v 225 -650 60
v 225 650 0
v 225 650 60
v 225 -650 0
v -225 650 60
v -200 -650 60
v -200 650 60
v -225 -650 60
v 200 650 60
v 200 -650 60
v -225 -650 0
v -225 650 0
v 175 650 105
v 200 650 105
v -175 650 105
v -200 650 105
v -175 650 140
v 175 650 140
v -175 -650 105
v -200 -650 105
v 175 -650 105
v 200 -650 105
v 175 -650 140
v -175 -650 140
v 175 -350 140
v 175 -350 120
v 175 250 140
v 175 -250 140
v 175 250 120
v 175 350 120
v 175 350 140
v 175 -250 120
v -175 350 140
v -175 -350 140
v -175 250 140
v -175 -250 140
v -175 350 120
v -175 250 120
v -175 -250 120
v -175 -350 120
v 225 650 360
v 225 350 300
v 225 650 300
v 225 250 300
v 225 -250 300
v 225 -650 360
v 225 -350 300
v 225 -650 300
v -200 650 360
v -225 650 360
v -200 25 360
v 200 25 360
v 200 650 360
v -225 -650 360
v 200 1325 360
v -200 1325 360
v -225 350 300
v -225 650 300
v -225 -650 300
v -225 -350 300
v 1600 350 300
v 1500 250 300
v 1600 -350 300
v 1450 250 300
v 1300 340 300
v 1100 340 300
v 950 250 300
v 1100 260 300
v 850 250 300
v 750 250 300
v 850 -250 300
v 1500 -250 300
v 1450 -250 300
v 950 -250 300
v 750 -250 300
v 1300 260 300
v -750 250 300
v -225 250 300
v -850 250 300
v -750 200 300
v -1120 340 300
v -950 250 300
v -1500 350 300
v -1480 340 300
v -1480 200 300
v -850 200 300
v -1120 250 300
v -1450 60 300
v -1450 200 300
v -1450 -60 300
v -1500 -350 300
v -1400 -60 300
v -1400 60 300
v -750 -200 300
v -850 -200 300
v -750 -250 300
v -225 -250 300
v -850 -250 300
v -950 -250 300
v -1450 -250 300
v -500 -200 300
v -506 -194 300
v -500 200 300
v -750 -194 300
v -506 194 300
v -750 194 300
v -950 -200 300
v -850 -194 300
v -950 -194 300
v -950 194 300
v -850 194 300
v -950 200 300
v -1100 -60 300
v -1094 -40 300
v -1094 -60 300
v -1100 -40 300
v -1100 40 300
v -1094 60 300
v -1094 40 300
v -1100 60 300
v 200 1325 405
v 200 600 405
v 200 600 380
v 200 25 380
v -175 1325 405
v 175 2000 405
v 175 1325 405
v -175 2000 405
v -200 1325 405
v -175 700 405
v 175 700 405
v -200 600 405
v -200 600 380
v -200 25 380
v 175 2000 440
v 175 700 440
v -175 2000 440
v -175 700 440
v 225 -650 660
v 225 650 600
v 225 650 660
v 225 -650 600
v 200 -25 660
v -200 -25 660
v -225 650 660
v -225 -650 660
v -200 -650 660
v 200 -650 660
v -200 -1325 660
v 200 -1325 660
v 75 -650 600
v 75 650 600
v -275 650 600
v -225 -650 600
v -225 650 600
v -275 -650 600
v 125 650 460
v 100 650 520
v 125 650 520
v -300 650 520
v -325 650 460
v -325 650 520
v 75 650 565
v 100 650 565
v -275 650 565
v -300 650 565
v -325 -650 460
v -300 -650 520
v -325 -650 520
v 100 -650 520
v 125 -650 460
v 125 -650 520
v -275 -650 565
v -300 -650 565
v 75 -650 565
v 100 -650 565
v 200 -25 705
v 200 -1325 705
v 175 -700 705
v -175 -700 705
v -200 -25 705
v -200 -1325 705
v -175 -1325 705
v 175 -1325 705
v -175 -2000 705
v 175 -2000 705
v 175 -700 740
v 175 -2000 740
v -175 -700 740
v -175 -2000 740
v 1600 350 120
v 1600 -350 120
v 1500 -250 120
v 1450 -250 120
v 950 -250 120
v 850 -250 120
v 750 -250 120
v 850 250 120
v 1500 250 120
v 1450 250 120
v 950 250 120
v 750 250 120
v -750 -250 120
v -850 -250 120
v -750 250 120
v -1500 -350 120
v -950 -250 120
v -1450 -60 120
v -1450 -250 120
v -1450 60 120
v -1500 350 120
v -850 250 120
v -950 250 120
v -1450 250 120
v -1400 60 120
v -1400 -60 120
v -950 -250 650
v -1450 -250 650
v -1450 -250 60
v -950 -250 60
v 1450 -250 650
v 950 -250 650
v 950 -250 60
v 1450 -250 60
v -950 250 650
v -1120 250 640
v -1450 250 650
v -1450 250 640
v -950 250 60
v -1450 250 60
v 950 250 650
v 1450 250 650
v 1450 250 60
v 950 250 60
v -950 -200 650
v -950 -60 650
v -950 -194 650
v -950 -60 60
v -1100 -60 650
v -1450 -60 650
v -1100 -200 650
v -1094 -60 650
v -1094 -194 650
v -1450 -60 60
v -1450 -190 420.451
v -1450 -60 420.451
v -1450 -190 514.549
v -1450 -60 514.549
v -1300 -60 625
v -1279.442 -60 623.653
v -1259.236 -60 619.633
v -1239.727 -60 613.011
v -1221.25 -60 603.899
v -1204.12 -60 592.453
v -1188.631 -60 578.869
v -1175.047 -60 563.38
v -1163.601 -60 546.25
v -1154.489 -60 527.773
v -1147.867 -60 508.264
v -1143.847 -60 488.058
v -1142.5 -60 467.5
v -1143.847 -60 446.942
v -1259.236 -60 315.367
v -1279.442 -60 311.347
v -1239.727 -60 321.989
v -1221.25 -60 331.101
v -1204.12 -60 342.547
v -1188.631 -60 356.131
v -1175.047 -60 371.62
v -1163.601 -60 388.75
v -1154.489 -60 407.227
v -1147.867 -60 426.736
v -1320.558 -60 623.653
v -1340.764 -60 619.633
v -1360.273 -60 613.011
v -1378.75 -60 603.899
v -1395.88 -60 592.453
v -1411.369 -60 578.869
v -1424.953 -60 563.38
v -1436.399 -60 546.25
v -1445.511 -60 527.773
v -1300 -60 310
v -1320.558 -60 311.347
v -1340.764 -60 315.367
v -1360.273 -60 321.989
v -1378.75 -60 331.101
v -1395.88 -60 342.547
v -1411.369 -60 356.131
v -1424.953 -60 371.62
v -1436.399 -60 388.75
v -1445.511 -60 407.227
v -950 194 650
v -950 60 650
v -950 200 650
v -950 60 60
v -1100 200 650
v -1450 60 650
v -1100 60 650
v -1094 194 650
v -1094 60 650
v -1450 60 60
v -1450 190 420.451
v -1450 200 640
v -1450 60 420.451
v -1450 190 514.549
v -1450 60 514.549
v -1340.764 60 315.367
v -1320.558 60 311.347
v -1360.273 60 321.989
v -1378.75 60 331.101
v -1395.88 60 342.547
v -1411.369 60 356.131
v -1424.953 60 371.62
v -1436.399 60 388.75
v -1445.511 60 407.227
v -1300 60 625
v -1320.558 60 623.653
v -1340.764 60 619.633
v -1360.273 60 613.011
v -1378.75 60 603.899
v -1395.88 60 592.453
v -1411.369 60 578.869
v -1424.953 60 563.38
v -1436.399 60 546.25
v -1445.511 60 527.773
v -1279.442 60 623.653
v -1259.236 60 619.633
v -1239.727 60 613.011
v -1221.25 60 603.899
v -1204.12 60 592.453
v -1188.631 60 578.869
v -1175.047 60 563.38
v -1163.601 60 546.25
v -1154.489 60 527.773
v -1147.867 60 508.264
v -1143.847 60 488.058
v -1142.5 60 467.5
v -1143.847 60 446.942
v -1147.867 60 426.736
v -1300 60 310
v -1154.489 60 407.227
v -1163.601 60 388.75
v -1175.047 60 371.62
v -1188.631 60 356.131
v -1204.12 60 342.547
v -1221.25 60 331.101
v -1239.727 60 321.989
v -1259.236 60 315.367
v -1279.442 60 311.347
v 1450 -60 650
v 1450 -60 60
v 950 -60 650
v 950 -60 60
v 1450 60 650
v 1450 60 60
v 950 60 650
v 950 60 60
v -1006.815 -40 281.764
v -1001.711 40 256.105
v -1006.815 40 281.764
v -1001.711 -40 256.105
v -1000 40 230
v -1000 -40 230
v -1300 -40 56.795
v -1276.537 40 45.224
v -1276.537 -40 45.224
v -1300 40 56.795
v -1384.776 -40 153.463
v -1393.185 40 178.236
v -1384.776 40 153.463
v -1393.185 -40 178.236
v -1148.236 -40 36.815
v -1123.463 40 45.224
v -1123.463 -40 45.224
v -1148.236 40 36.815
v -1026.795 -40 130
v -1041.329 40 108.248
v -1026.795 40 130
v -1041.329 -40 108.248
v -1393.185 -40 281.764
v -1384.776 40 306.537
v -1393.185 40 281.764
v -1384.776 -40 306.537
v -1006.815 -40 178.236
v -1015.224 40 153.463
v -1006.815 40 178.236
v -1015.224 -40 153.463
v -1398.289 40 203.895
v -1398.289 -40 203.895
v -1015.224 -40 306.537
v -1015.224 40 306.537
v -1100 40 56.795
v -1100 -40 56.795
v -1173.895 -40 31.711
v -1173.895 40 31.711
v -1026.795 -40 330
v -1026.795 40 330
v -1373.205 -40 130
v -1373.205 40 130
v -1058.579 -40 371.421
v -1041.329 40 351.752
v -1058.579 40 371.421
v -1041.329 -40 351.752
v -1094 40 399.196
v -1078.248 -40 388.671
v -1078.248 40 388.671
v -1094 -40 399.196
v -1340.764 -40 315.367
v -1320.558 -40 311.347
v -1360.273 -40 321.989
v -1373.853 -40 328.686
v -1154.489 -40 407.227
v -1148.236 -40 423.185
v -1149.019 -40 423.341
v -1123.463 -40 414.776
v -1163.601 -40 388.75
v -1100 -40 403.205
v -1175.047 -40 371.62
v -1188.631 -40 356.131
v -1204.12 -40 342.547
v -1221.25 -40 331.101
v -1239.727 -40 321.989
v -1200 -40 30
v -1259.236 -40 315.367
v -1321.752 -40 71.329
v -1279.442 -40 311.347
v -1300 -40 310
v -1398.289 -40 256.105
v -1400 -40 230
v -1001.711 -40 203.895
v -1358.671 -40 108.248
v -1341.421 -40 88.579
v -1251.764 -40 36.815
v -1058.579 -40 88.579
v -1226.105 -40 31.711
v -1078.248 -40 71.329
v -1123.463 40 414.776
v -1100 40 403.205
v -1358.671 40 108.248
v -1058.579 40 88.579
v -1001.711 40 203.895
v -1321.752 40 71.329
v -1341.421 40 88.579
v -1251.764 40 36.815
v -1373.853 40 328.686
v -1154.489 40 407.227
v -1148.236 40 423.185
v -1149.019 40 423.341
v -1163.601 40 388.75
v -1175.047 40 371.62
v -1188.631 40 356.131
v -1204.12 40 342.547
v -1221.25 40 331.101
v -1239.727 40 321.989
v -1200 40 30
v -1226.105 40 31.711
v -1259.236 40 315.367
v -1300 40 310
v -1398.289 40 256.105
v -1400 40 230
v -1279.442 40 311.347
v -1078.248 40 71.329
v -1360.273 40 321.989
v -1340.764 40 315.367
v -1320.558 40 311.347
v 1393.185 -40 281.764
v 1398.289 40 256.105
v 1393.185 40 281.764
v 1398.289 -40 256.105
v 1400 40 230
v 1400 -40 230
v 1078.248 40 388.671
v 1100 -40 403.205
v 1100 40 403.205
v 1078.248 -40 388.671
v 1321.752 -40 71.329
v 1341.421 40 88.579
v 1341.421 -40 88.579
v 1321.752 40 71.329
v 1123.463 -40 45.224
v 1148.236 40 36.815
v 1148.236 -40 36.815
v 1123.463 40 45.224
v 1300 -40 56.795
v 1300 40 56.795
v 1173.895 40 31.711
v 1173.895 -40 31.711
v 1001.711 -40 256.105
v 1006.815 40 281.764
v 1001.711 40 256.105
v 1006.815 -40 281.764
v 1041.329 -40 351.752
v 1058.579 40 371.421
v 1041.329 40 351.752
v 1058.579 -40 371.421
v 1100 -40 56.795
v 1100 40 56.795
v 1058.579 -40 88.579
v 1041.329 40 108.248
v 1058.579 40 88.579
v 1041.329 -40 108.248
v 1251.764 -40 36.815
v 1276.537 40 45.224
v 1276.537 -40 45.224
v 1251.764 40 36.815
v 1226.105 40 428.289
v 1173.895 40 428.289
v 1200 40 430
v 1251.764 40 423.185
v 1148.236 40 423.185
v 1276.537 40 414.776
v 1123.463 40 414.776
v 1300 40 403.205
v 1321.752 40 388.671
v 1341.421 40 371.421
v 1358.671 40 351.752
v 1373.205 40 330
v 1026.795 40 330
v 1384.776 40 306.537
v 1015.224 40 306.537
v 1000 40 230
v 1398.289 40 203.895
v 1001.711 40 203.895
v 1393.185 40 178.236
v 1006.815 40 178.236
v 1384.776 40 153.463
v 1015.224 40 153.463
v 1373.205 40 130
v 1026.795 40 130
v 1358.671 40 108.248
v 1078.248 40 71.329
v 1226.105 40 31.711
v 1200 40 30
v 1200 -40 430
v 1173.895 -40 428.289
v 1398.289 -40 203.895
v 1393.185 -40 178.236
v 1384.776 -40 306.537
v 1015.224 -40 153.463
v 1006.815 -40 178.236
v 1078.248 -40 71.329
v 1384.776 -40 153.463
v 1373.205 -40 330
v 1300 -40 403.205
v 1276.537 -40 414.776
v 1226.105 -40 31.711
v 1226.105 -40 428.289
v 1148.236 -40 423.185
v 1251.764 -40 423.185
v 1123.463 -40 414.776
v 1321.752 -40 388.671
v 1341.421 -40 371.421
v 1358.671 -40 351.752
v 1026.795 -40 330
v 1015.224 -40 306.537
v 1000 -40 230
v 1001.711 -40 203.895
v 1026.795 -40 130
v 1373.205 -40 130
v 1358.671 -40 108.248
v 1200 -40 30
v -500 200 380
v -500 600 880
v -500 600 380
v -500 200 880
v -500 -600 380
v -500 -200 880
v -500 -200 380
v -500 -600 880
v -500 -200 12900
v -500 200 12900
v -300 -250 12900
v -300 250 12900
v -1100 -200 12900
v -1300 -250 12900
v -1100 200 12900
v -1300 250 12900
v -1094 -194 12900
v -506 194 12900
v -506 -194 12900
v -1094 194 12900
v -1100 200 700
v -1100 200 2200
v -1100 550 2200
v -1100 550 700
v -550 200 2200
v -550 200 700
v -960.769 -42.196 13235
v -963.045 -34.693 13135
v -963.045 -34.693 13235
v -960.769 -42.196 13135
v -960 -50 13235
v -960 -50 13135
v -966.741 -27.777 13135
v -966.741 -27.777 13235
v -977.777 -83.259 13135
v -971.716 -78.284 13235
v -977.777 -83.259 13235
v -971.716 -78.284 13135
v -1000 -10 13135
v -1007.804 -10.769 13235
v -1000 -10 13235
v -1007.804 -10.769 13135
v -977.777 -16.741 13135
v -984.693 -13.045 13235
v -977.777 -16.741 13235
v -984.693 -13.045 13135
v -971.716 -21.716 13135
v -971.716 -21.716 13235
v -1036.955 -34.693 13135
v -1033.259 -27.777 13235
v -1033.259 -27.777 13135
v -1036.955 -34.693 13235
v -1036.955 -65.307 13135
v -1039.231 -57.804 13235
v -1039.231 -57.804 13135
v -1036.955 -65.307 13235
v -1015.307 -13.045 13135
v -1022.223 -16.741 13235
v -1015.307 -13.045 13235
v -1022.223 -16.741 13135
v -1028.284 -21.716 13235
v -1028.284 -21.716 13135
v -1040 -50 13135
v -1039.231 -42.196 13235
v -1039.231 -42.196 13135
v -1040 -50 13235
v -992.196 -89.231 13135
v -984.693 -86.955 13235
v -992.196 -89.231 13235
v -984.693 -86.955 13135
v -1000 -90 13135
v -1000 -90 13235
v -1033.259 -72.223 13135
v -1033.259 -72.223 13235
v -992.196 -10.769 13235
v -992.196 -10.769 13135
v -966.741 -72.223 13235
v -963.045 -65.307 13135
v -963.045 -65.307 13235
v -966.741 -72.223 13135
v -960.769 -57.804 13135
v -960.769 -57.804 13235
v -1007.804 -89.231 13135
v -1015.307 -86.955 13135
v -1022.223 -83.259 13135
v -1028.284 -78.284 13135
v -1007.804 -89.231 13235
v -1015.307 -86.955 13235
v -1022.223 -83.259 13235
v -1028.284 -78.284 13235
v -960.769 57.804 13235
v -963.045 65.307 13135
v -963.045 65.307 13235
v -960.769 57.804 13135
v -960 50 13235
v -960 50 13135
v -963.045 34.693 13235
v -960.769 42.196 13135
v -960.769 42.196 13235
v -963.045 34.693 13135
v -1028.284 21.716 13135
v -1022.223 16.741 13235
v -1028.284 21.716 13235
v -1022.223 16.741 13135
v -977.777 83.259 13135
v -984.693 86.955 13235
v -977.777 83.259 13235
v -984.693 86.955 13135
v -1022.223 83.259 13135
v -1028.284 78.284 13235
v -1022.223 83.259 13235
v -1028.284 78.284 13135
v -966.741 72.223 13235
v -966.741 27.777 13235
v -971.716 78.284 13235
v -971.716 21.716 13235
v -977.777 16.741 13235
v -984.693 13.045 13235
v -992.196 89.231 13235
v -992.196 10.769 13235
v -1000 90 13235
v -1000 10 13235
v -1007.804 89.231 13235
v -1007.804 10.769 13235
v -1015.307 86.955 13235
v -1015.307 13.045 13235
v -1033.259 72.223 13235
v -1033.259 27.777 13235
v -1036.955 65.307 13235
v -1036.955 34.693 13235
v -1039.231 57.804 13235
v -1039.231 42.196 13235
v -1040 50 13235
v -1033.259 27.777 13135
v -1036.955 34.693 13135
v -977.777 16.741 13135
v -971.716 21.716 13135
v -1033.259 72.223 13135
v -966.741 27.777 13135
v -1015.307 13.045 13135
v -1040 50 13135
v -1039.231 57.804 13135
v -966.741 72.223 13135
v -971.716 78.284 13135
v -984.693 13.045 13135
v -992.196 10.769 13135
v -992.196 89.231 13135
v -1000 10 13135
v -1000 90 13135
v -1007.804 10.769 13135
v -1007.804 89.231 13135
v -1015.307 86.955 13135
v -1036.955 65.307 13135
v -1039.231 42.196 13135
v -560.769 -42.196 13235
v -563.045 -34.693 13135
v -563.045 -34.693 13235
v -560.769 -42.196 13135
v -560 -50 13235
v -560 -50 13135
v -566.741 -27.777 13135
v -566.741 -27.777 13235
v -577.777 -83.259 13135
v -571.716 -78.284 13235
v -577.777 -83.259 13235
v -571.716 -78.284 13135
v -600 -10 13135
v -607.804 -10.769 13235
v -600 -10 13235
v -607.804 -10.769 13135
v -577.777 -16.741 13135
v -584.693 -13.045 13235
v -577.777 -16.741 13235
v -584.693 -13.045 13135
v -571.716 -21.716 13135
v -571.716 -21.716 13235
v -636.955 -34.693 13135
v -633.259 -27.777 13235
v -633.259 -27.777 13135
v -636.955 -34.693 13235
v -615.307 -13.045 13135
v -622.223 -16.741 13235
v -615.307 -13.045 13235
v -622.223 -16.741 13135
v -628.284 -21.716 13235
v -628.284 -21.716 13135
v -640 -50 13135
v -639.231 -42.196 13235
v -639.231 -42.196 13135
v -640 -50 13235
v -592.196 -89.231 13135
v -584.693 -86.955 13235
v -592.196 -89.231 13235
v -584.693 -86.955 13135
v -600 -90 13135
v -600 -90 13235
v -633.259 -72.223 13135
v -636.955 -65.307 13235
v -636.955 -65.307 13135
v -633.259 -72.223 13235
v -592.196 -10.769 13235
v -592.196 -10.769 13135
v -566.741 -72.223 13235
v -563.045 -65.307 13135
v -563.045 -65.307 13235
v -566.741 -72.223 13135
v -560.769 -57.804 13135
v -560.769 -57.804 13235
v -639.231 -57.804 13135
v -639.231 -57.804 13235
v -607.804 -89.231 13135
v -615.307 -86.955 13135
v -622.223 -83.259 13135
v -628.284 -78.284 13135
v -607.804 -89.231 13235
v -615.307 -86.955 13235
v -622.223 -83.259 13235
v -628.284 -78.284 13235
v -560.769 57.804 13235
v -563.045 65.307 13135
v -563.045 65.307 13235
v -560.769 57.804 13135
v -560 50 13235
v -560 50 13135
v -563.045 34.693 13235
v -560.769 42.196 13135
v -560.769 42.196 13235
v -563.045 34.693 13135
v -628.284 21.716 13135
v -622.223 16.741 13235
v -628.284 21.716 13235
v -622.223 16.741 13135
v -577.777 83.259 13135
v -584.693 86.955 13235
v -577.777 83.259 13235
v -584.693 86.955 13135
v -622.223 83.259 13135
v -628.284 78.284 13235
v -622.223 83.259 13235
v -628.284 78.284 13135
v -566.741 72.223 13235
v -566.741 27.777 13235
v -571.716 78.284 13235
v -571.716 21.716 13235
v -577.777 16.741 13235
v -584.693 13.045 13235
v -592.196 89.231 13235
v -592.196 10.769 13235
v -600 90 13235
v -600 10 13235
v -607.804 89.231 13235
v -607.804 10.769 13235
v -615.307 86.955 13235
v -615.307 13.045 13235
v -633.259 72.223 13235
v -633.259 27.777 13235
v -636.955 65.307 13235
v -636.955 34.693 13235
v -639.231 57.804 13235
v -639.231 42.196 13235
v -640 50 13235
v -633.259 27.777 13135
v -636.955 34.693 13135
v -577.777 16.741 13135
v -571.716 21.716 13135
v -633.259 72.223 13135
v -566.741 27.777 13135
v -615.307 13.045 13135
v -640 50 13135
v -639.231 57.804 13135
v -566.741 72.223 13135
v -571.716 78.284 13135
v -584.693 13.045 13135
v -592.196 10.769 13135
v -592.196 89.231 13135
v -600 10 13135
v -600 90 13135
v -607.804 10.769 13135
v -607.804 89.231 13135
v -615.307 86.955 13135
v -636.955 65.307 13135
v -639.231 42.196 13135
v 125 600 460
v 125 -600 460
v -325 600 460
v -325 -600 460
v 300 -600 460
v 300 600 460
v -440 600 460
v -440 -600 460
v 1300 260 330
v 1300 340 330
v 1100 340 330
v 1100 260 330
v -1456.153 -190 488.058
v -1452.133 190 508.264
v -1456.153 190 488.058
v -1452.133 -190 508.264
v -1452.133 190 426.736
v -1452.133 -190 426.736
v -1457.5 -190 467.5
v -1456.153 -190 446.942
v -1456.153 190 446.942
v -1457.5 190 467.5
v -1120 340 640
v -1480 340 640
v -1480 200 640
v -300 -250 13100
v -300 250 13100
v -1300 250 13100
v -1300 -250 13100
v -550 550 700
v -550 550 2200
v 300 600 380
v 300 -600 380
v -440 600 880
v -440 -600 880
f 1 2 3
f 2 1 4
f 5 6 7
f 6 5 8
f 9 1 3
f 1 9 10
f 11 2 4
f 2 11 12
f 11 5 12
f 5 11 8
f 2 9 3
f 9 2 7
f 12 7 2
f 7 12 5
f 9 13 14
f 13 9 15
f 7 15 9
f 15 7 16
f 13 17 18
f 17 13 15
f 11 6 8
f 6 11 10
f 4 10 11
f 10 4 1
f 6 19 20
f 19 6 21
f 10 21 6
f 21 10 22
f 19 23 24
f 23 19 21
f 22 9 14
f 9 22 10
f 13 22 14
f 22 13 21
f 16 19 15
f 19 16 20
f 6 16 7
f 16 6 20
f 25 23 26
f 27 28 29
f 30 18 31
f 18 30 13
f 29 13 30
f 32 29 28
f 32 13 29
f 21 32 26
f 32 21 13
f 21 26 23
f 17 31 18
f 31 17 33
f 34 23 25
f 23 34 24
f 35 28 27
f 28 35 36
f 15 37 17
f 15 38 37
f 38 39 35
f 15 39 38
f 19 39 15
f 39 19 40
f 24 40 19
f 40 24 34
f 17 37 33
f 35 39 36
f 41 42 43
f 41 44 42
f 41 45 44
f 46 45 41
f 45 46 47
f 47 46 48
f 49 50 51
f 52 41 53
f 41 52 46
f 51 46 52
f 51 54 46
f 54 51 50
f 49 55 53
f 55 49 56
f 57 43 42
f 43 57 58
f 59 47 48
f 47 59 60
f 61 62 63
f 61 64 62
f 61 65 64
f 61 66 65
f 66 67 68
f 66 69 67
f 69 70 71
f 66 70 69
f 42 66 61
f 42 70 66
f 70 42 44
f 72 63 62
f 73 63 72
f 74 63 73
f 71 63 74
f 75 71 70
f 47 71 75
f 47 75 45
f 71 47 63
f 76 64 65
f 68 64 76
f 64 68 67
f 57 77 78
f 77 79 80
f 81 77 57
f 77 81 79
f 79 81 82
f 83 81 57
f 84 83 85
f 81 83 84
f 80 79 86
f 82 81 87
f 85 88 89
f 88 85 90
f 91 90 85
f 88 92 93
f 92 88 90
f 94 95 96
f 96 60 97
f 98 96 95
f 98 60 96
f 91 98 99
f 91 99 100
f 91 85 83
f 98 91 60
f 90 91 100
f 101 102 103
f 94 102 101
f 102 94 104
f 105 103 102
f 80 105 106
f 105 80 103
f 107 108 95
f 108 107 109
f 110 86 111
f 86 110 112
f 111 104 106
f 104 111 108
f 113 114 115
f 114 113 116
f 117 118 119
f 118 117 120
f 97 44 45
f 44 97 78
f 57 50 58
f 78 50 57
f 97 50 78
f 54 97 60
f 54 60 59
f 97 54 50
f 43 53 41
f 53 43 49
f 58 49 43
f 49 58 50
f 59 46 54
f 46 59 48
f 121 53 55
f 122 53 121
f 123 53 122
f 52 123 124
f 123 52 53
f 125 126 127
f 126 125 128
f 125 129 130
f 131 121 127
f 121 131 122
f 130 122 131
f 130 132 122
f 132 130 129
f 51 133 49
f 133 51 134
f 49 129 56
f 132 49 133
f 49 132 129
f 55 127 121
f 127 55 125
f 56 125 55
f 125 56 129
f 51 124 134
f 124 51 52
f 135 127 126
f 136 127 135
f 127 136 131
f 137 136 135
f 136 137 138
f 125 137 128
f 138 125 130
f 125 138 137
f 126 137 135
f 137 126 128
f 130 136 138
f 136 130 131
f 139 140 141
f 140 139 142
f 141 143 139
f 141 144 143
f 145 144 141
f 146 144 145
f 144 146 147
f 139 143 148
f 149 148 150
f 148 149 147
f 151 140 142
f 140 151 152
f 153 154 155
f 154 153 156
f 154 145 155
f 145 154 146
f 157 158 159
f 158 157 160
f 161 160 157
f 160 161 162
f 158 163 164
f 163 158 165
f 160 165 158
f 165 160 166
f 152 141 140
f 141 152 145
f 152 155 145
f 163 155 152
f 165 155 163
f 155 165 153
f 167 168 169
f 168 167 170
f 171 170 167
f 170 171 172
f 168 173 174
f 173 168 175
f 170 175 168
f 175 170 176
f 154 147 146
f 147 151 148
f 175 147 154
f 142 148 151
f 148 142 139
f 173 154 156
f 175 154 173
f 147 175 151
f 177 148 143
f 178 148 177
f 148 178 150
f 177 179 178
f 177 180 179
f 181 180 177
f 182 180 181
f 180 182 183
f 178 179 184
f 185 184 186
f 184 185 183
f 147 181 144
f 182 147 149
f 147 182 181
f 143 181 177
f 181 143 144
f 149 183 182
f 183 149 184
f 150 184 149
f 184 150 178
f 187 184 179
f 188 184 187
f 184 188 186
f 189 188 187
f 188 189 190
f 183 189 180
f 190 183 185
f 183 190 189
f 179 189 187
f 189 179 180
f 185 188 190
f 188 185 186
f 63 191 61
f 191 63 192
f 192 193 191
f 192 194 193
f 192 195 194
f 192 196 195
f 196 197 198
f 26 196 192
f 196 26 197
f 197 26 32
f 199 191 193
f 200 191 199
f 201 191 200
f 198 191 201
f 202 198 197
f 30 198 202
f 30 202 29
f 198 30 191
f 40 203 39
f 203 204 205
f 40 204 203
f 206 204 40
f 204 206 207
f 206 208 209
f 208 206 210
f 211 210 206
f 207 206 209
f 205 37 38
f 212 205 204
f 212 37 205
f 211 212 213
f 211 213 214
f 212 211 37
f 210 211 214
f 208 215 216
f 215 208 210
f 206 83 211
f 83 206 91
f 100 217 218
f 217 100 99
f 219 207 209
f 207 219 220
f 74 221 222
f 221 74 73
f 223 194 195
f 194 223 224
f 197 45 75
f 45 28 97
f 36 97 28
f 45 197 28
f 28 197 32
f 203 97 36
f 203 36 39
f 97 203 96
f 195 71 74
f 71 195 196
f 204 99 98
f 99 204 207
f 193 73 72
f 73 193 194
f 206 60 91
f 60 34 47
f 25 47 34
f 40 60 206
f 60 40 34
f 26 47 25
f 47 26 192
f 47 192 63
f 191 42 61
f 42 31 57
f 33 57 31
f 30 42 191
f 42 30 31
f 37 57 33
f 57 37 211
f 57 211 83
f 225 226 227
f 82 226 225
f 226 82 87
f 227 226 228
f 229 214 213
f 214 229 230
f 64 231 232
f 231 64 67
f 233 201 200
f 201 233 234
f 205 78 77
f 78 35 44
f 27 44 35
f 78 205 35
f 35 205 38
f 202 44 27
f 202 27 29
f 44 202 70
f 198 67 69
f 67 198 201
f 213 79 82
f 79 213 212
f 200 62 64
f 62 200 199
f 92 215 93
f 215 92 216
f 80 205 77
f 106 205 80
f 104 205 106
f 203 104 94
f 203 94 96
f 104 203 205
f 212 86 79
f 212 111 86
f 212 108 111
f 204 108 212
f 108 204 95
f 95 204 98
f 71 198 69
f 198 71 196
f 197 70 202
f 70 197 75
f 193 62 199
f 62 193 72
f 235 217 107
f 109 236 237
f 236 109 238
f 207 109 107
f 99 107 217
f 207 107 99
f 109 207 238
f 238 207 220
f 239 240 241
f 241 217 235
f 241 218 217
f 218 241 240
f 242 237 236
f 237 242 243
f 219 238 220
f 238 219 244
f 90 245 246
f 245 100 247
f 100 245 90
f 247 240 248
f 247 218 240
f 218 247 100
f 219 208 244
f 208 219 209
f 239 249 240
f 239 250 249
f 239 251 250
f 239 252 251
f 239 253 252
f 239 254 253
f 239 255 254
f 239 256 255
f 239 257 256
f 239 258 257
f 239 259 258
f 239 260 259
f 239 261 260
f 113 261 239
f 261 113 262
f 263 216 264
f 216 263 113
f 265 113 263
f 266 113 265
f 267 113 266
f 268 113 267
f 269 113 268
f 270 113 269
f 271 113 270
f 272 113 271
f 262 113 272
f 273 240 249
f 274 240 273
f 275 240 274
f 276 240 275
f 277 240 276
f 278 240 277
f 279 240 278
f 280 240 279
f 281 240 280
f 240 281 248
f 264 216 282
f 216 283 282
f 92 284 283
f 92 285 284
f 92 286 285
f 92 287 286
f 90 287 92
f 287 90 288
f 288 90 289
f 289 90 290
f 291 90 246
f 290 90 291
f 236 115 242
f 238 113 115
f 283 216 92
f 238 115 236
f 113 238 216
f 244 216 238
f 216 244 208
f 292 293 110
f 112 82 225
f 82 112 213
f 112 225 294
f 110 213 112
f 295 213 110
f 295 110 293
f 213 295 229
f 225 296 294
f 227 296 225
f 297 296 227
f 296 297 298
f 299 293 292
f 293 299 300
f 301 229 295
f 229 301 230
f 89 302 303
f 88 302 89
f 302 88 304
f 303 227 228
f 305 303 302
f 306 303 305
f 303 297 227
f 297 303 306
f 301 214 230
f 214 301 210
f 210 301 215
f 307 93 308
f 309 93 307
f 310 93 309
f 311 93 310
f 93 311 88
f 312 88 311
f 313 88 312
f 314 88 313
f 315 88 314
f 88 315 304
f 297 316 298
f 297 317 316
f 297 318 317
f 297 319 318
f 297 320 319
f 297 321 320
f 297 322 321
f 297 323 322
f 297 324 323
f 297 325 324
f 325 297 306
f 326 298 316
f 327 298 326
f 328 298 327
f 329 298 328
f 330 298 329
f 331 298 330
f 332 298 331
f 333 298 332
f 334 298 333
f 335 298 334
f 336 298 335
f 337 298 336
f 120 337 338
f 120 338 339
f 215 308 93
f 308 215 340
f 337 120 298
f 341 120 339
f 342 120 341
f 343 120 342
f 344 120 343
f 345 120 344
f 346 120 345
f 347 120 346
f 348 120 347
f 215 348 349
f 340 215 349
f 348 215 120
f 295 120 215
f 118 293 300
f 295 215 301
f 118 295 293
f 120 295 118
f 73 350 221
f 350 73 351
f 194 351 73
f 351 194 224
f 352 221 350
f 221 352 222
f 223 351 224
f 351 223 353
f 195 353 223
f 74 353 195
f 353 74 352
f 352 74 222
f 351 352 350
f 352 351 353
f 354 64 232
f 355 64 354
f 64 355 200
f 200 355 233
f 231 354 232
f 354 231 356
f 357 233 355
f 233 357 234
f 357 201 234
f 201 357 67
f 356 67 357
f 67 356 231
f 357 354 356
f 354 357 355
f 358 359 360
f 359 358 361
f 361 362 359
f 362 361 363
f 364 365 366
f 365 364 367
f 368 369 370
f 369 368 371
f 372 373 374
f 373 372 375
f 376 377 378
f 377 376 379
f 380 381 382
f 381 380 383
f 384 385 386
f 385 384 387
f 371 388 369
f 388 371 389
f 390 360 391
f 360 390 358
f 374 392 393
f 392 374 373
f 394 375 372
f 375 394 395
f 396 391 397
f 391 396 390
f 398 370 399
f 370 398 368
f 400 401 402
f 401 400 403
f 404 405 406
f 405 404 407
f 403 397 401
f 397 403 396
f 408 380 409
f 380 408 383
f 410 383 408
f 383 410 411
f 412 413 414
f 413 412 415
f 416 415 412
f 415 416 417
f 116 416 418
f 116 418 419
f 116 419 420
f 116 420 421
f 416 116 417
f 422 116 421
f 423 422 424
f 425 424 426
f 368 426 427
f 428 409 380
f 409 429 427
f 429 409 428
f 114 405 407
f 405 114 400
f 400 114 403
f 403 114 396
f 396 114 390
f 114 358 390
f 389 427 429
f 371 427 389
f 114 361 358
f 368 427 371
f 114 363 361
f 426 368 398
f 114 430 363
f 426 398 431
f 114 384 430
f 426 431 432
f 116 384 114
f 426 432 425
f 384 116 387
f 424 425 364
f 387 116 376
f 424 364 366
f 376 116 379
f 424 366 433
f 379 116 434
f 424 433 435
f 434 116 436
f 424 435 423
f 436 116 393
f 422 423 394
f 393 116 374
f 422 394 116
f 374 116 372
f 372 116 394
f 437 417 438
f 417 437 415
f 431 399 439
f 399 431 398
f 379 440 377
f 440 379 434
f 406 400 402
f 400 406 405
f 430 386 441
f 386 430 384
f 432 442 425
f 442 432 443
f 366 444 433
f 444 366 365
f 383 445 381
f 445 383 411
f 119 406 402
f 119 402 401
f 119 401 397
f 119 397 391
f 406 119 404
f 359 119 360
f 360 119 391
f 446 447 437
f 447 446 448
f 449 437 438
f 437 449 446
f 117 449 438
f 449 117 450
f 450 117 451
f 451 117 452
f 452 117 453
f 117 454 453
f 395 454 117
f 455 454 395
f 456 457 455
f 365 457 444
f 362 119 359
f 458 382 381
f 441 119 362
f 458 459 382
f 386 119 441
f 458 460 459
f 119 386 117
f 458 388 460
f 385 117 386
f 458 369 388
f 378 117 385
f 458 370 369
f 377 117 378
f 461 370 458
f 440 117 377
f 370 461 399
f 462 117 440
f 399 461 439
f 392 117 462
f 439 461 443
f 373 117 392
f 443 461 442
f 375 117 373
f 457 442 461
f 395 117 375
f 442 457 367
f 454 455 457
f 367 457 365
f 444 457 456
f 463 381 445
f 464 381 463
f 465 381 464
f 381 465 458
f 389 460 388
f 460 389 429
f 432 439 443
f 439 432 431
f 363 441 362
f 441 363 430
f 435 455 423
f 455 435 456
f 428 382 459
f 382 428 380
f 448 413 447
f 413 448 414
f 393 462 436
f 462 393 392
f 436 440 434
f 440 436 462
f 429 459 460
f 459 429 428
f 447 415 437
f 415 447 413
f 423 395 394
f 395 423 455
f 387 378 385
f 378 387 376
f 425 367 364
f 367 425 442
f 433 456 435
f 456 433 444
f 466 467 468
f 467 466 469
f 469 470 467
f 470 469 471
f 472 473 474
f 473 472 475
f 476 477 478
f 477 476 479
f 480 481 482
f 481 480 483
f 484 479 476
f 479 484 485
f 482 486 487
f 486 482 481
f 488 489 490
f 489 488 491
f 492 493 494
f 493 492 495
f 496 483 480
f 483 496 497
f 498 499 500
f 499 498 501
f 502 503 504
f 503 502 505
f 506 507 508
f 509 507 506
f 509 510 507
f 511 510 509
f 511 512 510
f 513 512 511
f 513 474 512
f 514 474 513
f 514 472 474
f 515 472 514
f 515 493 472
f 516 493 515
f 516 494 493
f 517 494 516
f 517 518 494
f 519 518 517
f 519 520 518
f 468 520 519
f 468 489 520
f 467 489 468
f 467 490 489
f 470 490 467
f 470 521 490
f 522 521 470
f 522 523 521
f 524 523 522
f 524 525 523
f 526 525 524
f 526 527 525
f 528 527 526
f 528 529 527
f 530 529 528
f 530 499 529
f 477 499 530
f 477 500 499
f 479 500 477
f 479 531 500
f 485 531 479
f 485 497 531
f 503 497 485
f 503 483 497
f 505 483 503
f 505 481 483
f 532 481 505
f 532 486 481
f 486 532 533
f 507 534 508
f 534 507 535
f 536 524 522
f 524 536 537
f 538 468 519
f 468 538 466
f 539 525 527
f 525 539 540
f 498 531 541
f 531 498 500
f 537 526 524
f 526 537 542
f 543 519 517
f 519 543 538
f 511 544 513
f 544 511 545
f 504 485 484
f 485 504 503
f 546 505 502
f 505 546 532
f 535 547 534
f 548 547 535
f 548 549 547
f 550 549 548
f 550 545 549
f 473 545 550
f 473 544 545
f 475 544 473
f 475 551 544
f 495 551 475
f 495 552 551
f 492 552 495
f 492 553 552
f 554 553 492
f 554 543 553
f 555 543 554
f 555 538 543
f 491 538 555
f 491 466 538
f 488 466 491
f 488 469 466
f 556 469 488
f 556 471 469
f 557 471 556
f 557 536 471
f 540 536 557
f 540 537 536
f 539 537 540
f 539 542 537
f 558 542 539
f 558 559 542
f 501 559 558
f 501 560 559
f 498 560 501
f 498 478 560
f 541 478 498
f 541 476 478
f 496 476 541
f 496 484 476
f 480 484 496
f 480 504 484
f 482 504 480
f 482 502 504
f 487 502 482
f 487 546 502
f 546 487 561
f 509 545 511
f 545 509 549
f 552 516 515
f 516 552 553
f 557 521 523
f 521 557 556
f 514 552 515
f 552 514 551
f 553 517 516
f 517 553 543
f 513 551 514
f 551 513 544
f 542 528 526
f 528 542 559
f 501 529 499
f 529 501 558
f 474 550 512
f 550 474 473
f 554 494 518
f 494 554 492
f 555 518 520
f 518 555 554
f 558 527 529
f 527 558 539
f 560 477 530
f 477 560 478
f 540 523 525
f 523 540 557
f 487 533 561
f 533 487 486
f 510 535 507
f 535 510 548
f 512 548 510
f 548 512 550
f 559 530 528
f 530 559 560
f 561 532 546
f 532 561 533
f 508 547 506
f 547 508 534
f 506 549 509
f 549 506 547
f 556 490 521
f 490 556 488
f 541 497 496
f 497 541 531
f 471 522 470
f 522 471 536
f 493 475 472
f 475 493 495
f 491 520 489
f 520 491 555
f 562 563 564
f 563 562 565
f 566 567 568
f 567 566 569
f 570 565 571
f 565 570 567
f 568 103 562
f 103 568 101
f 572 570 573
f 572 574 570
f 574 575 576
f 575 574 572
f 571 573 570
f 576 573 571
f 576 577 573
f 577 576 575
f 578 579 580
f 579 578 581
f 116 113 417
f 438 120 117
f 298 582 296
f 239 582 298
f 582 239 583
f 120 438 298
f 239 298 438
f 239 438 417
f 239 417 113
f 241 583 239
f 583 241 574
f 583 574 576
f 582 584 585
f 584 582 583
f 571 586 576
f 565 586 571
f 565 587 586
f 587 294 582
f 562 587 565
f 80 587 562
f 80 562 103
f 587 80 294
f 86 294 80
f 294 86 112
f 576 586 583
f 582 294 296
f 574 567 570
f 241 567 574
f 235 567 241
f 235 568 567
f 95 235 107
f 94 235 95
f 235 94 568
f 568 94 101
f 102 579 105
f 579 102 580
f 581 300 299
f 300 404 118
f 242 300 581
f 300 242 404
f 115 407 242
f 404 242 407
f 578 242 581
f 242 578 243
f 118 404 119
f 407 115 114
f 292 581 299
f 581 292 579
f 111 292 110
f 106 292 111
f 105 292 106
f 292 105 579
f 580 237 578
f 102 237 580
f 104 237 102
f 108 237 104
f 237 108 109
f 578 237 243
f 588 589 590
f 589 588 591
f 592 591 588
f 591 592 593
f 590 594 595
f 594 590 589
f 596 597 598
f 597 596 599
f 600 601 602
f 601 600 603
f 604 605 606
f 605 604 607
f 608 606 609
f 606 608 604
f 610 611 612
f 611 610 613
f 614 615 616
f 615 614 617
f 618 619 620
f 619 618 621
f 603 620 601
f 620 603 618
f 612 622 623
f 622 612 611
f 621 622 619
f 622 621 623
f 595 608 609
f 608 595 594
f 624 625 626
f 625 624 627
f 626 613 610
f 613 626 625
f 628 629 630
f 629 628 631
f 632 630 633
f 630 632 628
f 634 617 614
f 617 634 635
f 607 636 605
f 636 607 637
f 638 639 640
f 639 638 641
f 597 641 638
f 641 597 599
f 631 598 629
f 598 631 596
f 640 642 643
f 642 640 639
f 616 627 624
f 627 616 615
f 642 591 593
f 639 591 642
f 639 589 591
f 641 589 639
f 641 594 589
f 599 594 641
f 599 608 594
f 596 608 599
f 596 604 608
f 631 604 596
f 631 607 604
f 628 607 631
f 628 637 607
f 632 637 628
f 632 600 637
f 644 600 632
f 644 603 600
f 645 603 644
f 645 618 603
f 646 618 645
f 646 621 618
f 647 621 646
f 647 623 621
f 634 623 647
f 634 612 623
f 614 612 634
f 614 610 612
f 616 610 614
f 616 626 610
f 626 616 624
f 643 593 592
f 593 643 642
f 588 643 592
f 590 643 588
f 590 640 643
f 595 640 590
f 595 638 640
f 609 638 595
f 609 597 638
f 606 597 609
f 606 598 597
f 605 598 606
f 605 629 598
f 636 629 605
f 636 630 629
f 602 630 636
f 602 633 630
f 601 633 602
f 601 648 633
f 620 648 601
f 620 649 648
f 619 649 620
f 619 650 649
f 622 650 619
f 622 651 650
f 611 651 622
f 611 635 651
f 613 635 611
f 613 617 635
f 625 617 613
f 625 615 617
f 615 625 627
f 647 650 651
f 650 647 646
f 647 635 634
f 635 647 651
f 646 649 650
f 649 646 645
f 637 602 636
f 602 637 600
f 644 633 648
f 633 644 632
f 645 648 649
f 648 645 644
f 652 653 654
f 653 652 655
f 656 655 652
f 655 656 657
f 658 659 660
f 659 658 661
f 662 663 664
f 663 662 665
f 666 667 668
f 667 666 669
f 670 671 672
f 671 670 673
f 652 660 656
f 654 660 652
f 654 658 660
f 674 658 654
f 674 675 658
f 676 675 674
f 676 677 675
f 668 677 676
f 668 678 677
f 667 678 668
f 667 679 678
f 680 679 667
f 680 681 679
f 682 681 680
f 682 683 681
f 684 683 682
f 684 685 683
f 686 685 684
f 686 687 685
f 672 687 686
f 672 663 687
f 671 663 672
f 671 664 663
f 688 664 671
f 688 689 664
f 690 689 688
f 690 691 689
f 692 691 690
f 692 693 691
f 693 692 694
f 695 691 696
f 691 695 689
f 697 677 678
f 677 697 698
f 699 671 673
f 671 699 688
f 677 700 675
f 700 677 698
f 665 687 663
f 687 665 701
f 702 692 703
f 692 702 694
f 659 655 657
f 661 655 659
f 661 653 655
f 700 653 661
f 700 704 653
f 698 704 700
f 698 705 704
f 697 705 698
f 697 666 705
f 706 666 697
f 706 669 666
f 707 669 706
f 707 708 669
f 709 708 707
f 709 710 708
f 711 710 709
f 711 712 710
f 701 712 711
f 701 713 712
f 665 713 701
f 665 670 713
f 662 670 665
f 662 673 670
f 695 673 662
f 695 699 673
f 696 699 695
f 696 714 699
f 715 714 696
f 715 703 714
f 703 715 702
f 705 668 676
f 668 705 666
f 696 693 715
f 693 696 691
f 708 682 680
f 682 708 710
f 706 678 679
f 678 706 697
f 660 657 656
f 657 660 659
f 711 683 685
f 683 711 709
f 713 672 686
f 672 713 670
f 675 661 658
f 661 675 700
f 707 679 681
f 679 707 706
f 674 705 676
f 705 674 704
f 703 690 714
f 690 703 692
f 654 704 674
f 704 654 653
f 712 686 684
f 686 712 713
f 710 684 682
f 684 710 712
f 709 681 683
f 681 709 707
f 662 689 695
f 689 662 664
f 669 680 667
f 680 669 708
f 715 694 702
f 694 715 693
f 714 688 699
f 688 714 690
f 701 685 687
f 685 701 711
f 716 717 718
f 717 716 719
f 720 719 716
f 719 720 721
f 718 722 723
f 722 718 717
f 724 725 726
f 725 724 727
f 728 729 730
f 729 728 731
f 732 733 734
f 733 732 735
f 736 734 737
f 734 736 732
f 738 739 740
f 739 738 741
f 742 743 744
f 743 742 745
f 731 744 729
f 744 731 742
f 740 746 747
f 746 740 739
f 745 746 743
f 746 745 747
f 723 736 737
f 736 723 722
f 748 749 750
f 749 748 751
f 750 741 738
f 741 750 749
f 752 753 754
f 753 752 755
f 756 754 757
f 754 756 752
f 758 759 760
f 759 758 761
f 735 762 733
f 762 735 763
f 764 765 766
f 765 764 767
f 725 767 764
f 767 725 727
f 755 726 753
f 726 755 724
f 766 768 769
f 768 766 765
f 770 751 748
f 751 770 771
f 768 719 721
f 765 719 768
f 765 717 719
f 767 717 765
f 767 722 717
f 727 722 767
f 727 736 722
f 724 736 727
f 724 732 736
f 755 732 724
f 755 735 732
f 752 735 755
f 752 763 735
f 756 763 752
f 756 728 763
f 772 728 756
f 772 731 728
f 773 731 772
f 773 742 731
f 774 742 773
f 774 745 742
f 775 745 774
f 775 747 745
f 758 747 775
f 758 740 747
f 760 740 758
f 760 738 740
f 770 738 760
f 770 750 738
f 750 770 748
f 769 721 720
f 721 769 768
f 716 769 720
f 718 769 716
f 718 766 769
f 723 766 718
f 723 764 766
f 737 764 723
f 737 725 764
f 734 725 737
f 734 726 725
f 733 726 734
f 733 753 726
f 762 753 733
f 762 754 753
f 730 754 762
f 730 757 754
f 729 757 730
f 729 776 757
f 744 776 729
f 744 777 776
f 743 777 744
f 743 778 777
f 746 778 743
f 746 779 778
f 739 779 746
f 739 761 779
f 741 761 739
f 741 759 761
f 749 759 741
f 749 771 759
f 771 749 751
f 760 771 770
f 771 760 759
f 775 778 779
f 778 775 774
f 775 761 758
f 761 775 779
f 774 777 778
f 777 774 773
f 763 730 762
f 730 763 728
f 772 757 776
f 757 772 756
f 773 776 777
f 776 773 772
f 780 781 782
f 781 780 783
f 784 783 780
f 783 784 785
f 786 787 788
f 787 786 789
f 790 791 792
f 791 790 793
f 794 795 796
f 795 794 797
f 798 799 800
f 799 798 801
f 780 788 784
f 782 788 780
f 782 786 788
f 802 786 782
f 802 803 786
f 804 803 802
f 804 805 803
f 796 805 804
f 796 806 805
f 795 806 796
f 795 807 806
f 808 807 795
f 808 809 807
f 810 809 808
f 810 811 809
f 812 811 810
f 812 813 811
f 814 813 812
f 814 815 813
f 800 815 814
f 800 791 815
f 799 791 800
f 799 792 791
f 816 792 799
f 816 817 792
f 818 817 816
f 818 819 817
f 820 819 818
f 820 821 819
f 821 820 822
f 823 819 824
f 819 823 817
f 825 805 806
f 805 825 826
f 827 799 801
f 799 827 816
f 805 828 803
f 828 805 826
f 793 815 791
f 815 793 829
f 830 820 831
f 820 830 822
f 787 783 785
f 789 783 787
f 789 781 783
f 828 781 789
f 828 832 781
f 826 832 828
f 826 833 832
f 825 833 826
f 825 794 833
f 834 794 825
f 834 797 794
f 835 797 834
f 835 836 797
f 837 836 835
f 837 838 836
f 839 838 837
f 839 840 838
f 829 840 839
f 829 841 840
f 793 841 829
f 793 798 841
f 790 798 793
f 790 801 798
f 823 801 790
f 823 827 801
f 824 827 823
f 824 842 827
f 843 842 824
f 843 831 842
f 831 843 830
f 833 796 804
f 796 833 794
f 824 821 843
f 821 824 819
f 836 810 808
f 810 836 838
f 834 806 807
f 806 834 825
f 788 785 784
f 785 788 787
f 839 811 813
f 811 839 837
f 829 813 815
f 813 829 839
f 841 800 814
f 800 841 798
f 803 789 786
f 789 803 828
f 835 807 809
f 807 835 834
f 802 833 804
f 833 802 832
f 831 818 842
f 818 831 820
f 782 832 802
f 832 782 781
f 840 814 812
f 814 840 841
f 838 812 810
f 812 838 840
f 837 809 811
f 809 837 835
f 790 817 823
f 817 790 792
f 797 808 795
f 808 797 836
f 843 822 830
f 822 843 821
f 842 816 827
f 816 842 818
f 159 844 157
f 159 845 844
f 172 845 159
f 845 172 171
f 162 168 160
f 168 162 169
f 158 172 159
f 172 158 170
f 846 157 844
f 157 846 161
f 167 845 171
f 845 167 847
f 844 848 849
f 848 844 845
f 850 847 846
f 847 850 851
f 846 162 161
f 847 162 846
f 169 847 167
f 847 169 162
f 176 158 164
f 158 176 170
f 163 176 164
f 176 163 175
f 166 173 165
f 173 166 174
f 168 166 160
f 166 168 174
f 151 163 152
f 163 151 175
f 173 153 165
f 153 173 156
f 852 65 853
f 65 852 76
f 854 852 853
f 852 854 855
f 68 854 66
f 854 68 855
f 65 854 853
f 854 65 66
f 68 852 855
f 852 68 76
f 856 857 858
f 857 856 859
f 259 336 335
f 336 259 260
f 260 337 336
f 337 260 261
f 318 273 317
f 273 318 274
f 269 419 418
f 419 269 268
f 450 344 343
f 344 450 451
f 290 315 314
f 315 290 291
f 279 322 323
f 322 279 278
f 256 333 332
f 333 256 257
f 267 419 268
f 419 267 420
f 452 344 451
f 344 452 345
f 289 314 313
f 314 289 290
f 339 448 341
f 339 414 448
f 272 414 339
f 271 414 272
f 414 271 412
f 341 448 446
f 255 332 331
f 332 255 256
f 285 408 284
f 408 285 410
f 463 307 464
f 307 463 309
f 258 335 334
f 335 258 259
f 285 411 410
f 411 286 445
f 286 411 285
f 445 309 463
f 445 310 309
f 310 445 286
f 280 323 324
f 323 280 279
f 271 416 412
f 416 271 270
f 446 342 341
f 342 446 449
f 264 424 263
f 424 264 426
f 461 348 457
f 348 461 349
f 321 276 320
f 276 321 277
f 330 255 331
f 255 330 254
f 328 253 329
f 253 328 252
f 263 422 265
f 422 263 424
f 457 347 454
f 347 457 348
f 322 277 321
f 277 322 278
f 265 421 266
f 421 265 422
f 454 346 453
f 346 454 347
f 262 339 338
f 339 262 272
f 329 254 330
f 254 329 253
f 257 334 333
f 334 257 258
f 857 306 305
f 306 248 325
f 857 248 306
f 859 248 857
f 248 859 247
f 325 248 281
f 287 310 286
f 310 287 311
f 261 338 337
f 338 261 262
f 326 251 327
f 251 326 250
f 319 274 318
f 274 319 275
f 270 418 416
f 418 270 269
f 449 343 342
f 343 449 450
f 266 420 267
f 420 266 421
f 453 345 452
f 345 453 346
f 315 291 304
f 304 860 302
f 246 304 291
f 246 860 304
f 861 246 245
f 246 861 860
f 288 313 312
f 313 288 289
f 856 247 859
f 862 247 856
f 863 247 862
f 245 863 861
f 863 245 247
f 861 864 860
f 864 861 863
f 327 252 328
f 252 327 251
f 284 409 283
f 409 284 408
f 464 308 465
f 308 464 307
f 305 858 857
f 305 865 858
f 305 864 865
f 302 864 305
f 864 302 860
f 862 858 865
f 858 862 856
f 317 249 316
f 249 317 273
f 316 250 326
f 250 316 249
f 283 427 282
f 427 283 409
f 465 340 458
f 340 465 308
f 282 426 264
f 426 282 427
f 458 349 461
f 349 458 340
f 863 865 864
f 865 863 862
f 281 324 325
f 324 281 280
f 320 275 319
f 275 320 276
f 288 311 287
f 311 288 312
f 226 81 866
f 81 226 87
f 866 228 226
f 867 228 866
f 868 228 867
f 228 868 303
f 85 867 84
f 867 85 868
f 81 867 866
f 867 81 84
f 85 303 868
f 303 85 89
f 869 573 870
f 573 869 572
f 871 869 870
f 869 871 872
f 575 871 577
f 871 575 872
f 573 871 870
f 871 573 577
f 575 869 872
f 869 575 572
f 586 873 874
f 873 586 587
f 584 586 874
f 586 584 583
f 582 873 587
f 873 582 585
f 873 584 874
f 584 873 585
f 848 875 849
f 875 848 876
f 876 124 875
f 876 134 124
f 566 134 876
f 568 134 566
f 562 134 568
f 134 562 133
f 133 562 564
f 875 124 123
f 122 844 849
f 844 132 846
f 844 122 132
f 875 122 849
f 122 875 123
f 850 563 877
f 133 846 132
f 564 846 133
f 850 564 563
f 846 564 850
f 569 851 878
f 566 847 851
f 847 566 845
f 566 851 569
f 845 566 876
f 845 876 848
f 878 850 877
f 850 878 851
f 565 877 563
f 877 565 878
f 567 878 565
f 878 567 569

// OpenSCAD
// file: fork.scad
// Telescopic fork, 3 stages - generated by asrs_3d.py from out/design_result.json (F3) - units mm
// DESIGN - to be checked and released by the responsible engineer. Coordinates: x along aisle, y across, z up.

bays = 19;
levels = 10;
bay = 1925;
L_rack = 36675;
H_rack = 12600;
W_rack = 4100;
clear_beam = 1825;
z1 = 450;
pitch = 1250;
up_w = 100;
up_d = 80;
gap = 75;
aisle = 1500;
x0 = 1200;
y_face = 750;
y_rear = 2050;
y_crate_c = 1400;
cL = 1200;
cW = 800;
cH = 600;
c_leg = 160;
beam_h = 120;
beam_b = 50;
mast_h = 600;
mast_b = 400;
mast_t = 6;
H_mast = 13100;
wheel_D = 400;
wheelbase = 2400;
stroke = 1350;
drum_D = 315;
conv_top = 700;
fork_len = 1300;
rail_top_z0 = 13130;
rail_top_z1 = 13250;
tie_z0 = 13250;
tie_z1 = 13350;
fork_w = [450, 400, 350];  fork_t = [60, 45, 35];
function lz(l) = z1 + (l - 1) * pitch;     // beam top of level l
function cx(b, k) = x0 + b * bay + up_w + gap + cW / 2 + k * (cW + gap);
module box(a, b) { translate(a) cube([b[0]-a[0], b[1]-a[1], b[2]-a[2]]); }
module brace(a, b, w=40) { hull() { translate(a - [w/2, w/2, w/2]) cube(w); translate(b - [w/2, w/2, w/2]) cube(w); } }

// ext = stroke of the top stage (0 .. stroke), side = +1 right / -1 left
module fork(ext = 0, side = 1, z0 = 0) {
  sh = [0, ext / 2, ext];
  for (k = [0 : 2]) translate([-fork_w[k]/2, -fork_len/2 + side * sh[k], z0 + (k == 0 ? 0 : (k == 1 ? fork_t[0] : fork_t[0] + fork_t[1]))])
    cube([fork_w[k], fork_len, fork_t[k]]);
}
fork(0); translate([0, 0, 300]) fork(stroke, 1); translate([0, 0, 600]) fork(stroke, -1);
// main file
// Single-mast stacker crane (local x = bottom frame centre) - generated by asrs_3d.py from out/design_result.json (F3) - units mm
// DESIGN - to be checked and released by the responsible engineer. Coordinates: x along aisle, y across, z up.

bays = 19;
levels = 10;
bay = 1925;
L_rack = 36675;
H_rack = 12600;
W_rack = 4100;
clear_beam = 1825;
z1 = 450;
pitch = 1250;
up_w = 100;
up_d = 80;
gap = 75;
aisle = 1500;
x0 = 1200;
y_face = 750;
y_rear = 2050;
y_crate_c = 1400;
cL = 1200;
cW = 800;
cH = 600;
c_leg = 160;
beam_h = 120;
beam_b = 50;
mast_h = 600;
mast_b = 400;
mast_t = 6;
H_mast = 13100;
wheel_D = 400;
wheelbase = 2400;
stroke = 1350;
drum_D = 315;
conv_top = 700;
fork_len = 1300;
rail_top_z0 = 13130;
rail_top_z1 = 13250;
tie_z0 = 13250;
tie_z1 = 13350;
fork_w = [450, 400, 350];  fork_t = [60, 45, 35];
function lz(l) = z1 + (l - 1) * pitch;     // beam top of level l
function cx(b, k) = x0 + b * bay + up_w + gap + cW / 2 + k * (cW + gap);
module box(a, b) { translate(a) cube([b[0]-a[0], b[1]-a[1], b[2]-a[2]]); }
module brace(a, b, w=40) { hull() { translate(a - [w/2, w/2, w/2]) cube(w); translate(b - [w/2, w/2, w/2]) cube(w); } }

include <fork.scad>
level = 1; ext = 0; side = 1;
module crane(level = 1, ext = 0, side = 1) {
  r = wheel_D / 2; zc = 30 + r; wb = wheelbase / 2;
  for (s = [-1, 1]) box([-1500, min(s*250, s*350), 120], [1600, max(s*250, s*350), 300]);
  for (x = [-1450, -800, 800, 1550]) box([x - 50, -250, 120], [x + 50, 250, 300]);
  for (xw = [-wb, wb]) { for (s = [-1, 1]) box([xw - 250, min(s*60, s*250), 60], [xw + 250, max(s*60, s*250), 650]);
    translate([xw, 0, zc]) rotate([90, 0, 0]) cylinder(r = r, h = 80, center = true, $fn = 48); }
  translate([wb - 100, 260, 130]) cube([200, 80, 200]);
  translate([-1300, 0, 300 + drum_D / 2 + 10]) rotate([90, 0, 0]) cylinder(r = drum_D / 2, h = 380, center = true, $fn = 48);
  box([-1480, 200, 300], [-1120, 340, 640]);
  translate([-1100, -mast_b / 2, 300]) difference() { cube([mast_h, mast_b, H_mast - 500]);
    translate([mast_t, mast_t, -1]) cube([mast_h - 2*mast_t, mast_b - 2*mast_t, H_mast]); }
  box([-1300, -250, H_mast - 200], [-300, 250, H_mast]);
  for (x = [-1000, -600], s = [-1, 1]) translate([x, s * 50, rail_top_z0 + 5]) cylinder(r = 40, h = 100, $fn = 32);
  box([-1100, mast_b / 2, 700], [-550, mast_b / 2 + 350, 2200]);
  zf = lz(level) + 10;
  box([-500, -600, zf - 80], [300, 600, zf]); box([-500, -600, zf - 80], [-440, 600, zf + 420]);
  translate([-100, 0, 0]) fork(ext, side, zf);
}
crane(level, ext, side);
